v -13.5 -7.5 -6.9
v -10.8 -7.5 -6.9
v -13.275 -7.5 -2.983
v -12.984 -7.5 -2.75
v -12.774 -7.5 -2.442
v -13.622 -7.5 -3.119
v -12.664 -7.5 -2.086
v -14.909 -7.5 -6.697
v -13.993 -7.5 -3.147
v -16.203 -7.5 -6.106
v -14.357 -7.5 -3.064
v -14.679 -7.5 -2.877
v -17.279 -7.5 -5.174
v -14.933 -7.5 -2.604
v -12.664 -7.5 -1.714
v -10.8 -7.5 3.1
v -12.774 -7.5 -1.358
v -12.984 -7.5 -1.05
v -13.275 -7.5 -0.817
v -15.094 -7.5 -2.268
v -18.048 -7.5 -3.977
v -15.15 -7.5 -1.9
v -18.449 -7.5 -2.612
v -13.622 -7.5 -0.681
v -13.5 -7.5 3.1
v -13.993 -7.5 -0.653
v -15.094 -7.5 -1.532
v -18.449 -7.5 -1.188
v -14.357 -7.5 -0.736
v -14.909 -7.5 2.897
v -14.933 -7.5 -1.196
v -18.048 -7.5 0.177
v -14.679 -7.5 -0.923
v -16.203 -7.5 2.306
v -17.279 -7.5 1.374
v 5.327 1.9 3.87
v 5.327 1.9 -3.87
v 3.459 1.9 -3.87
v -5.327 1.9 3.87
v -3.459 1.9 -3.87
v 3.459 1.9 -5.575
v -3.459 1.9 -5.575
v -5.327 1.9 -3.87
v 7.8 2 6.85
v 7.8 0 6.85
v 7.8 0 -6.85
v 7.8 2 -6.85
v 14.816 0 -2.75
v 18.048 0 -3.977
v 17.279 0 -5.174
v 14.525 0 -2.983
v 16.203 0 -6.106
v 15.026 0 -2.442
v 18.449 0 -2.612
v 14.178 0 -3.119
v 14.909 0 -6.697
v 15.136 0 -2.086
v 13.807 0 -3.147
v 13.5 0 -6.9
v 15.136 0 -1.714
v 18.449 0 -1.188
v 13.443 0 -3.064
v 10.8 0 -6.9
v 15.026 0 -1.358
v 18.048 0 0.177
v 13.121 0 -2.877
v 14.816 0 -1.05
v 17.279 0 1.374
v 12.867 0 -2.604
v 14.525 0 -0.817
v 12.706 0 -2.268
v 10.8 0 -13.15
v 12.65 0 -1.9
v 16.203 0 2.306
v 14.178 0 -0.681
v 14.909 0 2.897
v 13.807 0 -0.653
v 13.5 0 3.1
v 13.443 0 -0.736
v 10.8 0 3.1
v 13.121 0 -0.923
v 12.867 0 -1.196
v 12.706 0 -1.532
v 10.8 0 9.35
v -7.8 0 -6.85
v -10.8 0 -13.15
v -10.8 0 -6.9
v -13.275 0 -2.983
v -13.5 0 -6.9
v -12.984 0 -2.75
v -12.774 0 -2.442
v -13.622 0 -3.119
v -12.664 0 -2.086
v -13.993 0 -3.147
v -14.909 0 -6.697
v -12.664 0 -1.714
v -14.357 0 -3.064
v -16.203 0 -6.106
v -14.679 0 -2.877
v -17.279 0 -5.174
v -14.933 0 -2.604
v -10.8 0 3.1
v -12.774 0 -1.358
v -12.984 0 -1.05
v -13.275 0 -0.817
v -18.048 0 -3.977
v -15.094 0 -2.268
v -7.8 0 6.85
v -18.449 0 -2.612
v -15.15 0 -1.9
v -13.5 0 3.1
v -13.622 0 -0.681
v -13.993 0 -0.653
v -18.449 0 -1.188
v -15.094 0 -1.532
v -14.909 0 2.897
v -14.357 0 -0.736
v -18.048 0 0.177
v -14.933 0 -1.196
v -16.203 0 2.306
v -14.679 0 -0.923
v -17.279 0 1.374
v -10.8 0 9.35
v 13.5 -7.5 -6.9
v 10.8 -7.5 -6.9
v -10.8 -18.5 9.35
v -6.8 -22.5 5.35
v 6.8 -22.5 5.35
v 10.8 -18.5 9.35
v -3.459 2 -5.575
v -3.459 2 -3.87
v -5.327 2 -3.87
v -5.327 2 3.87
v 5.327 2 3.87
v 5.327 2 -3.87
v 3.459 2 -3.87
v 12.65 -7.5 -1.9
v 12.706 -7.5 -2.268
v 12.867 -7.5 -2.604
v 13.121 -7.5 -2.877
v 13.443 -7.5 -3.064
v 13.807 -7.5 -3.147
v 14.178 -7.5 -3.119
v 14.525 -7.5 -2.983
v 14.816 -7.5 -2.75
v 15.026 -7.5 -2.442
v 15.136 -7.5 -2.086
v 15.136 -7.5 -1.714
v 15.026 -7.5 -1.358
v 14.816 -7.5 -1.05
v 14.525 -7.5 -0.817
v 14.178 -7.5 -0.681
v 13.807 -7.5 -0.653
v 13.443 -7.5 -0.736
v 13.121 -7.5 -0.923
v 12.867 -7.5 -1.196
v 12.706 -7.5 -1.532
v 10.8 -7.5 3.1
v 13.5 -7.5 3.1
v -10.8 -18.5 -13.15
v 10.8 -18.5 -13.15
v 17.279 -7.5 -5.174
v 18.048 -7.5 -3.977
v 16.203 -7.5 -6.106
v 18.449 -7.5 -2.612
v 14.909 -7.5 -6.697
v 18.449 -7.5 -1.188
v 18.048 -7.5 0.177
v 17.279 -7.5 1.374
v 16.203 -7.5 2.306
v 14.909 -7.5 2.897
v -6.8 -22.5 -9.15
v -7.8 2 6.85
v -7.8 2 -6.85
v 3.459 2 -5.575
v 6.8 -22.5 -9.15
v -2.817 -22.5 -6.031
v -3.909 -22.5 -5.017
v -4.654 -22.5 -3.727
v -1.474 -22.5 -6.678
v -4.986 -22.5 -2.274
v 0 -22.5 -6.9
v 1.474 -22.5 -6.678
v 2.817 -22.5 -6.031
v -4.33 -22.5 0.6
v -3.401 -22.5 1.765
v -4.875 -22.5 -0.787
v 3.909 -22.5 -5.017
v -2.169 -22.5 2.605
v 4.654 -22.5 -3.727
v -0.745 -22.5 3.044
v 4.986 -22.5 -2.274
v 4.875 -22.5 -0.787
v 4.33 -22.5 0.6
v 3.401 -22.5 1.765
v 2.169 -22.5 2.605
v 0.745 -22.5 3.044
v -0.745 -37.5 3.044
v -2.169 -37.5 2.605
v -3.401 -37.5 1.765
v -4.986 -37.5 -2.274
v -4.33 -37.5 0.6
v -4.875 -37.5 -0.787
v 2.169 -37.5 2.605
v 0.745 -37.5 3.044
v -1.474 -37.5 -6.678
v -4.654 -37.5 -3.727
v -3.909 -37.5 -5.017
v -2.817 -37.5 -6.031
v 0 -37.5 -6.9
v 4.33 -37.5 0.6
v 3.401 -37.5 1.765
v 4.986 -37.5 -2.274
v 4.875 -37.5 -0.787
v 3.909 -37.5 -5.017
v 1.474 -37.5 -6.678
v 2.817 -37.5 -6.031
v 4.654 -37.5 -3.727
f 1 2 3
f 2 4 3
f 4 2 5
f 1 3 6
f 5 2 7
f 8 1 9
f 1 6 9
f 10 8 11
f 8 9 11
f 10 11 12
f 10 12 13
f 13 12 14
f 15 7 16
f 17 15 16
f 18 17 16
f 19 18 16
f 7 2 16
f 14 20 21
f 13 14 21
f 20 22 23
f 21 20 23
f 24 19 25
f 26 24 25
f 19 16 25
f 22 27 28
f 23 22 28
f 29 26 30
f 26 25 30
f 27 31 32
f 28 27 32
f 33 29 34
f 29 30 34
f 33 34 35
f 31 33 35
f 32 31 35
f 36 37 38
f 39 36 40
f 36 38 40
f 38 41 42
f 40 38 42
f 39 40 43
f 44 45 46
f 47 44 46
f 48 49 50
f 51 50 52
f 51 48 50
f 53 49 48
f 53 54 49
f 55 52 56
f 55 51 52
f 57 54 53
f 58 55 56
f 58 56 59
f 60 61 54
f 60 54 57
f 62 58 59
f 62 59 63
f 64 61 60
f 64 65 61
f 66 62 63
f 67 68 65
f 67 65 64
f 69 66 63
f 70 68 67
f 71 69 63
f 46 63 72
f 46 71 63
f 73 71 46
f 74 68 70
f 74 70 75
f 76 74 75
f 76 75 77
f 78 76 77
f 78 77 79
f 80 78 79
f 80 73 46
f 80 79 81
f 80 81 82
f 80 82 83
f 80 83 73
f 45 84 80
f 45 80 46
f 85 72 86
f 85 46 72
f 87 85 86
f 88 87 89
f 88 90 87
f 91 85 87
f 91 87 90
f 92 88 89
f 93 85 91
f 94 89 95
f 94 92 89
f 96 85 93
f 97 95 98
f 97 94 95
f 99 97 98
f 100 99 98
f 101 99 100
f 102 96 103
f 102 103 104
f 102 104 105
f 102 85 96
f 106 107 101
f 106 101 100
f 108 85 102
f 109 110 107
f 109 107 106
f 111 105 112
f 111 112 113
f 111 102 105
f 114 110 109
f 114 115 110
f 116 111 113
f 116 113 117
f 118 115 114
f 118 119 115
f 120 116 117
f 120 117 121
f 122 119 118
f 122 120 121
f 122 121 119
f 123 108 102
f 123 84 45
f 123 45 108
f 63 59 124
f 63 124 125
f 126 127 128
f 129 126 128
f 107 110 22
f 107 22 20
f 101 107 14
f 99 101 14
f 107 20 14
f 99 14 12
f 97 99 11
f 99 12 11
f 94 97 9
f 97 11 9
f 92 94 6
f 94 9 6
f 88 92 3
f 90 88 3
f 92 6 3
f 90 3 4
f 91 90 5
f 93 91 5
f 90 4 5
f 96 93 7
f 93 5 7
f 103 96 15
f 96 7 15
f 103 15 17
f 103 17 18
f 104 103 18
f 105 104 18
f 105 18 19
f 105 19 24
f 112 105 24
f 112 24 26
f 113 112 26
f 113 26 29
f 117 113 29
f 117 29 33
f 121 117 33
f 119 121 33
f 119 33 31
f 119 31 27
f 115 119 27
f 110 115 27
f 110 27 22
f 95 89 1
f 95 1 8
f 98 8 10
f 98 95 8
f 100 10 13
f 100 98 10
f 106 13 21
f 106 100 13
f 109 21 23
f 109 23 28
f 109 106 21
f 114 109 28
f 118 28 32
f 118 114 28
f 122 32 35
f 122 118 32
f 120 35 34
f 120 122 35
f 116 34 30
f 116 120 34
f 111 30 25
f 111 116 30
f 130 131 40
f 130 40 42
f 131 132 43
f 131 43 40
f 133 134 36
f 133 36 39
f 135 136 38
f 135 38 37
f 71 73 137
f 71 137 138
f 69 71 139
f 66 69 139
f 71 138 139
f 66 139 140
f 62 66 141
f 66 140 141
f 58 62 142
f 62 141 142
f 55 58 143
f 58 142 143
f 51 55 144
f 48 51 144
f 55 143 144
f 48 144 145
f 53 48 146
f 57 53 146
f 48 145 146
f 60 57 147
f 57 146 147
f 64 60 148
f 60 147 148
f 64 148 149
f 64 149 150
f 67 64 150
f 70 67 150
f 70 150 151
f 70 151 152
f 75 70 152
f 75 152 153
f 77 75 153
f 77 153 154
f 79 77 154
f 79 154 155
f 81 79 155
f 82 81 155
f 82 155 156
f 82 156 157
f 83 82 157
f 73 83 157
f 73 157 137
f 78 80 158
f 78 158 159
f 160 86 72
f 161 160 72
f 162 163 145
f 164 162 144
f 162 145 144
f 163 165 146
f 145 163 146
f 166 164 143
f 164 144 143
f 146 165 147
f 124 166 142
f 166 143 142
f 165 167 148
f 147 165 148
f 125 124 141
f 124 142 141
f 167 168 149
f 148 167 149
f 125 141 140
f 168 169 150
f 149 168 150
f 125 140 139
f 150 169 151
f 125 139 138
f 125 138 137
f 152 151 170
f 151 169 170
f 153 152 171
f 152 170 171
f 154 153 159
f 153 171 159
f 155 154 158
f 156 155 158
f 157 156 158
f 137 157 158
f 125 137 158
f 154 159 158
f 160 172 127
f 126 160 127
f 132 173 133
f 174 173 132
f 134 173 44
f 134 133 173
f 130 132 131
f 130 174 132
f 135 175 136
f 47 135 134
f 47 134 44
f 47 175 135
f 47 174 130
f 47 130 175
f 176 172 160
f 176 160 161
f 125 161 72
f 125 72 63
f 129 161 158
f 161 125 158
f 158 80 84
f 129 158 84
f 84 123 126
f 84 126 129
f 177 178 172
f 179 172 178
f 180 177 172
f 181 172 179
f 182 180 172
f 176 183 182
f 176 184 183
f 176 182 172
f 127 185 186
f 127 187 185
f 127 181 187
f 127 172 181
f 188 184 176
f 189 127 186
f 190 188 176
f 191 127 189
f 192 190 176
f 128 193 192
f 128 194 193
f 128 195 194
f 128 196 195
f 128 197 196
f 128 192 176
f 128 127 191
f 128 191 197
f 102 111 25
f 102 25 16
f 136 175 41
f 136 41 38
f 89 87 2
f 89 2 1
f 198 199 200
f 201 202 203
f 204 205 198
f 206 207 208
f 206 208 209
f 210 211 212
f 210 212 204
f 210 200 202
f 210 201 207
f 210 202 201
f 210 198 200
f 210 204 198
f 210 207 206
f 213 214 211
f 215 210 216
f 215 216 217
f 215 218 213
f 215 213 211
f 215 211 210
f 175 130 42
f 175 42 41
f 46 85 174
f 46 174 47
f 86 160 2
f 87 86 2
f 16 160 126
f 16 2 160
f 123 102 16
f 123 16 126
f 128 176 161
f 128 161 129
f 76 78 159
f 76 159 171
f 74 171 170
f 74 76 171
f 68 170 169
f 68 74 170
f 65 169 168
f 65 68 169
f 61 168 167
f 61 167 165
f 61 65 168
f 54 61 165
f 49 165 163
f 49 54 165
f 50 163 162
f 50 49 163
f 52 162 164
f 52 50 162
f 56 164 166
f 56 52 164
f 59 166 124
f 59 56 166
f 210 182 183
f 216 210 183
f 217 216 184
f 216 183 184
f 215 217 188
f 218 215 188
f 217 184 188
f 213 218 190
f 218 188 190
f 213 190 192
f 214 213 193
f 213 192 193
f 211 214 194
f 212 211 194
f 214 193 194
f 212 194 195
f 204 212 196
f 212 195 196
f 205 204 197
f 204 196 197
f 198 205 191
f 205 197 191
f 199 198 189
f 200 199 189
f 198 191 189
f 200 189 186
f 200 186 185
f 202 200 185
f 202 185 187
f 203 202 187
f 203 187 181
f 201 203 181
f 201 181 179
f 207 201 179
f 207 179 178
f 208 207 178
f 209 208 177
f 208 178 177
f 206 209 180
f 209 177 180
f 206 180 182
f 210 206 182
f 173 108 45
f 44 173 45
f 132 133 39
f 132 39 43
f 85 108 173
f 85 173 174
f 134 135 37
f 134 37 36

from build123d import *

# Parameters (mm, degrees)
SKETCH_1_W          = 15.6
SKETCH_1_H          = 13.7
EXTRUDE_1_DEPTH     = 2
EXTRUDE_2_DEPTH     = 7.5
SKETCH_4_W          = 21.6
SKETCH_4_H          = 22.5
EXTRUDE_3_DEPTH     = 15
CHAMFER_1_SIZE      = 4
SKETCH_5_R          = 5
EXTRUDE_4_DEPTH     = 15
CUT_EXTRUDE_1_DEPTH = 0.1
HOLE_WIZARD_M3_1_D  = 2.5


with BuildPart() as part:
    # 草图1 → 凸台-拉伸1 (new body)
    with BuildSketch(Plane(origin=(0, 0, 0), x_dir=(1, 0, 0), z_dir=(0, 1, 0))):
        Rectangle(SKETCH_1_W, SKETCH_1_H)
    extrude(amount=EXTRUDE_1_DEPTH)

    # 草图3 → 凸台-拉伸2 (add)
    with BuildSketch(Plane.XZ):
        with BuildLine():
            Line((-10.8, 9.35), (10.8, 9.35))
            Line((10.8, 9.35), (10.8, 3.1))
            Line((10.8, 3.1), (13.5, 3.1))
            ThreePointArc((13.5, 3.1), (18.5, -1.9), (13.5, -6.9))
            Line((13.5, -6.9), (10.8, -6.9))
            Line((10.8, -6.9), (10.8, -13.15))
            Line((10.8, -13.15), (-10.8, -13.15))
            Line((-10.8, -13.15), (-10.8, -6.9))
            Line((-10.8, -6.9), (-13.5, -6.9))
            ThreePointArc((-13.5, -6.9), (-18.5, -1.9), (-13.5, 3.1))
            Line((-13.5, 3.1), (-10.8, 3.1))
            Line((-10.8, 3.1), (-10.8, 9.35))
        make_face()
    extrude(amount=EXTRUDE_2_DEPTH)

    # 草图4 → 凸台-拉伸3 (add)
    with BuildSketch(Plane.XZ.offset(7.5)):
        with Locations((0, -1.9)):
            Rectangle(SKETCH_4_W, SKETCH_4_H)
    extrude(amount=EXTRUDE_3_DEPTH)

    # 倒角1
    chamfer_1_edges = [part.edges().sort_by_distance(p)[0] for p in [
        (-10.8, -22.5, -1.9),
        (0, -22.5, -13.15),
        (10.8, -22.5, -1.9),
        (0, -22.5, 9.35),
    ]]
    chamfer(chamfer_1_edges, length=CHAMFER_1_SIZE)

    # 草图5 → 凸台-拉伸4 (add)
    with BuildSketch(Plane.XZ.offset(22.5)):
        with Locations(Location((0, -1.9, 0), (0, 0, 270))):
            Circle(SKETCH_5_R)
    extrude(amount=EXTRUDE_4_DEPTH)

    # 草图6 → 切除-拉伸1 (cut)
    with BuildSketch(Plane(origin=(0, 2, 0), x_dir=(1, 0, 0), z_dir=(0, 1, 0))):
        Polygon((5.326744566, -3.869583795), (-5.326744566, -3.869583795), (-5.326744566, 3.869583795), (-3.458685709, 3.869583795), (-3.458685709, 5.575202752), (3.458685709, 5.575202752), (3.458685709, 3.869583795), (5.326744566, 3.869583795), align=None)
    extrude(amount=-CUT_EXTRUDE_1_DEPTH, mode=Mode.SUBTRACT)

    # M3 螺纹孔1 (through all)
    with Locations(Plane(origin=(0, 0, 0), x_dir=(1, 0, 0), z_dir=(0, 1, 0))):
        with Locations((13.9, 1.9), (-13.9, 1.9)):
            Hole(HOLE_WIZARD_M3_1_D / 2)


solid = part.part
